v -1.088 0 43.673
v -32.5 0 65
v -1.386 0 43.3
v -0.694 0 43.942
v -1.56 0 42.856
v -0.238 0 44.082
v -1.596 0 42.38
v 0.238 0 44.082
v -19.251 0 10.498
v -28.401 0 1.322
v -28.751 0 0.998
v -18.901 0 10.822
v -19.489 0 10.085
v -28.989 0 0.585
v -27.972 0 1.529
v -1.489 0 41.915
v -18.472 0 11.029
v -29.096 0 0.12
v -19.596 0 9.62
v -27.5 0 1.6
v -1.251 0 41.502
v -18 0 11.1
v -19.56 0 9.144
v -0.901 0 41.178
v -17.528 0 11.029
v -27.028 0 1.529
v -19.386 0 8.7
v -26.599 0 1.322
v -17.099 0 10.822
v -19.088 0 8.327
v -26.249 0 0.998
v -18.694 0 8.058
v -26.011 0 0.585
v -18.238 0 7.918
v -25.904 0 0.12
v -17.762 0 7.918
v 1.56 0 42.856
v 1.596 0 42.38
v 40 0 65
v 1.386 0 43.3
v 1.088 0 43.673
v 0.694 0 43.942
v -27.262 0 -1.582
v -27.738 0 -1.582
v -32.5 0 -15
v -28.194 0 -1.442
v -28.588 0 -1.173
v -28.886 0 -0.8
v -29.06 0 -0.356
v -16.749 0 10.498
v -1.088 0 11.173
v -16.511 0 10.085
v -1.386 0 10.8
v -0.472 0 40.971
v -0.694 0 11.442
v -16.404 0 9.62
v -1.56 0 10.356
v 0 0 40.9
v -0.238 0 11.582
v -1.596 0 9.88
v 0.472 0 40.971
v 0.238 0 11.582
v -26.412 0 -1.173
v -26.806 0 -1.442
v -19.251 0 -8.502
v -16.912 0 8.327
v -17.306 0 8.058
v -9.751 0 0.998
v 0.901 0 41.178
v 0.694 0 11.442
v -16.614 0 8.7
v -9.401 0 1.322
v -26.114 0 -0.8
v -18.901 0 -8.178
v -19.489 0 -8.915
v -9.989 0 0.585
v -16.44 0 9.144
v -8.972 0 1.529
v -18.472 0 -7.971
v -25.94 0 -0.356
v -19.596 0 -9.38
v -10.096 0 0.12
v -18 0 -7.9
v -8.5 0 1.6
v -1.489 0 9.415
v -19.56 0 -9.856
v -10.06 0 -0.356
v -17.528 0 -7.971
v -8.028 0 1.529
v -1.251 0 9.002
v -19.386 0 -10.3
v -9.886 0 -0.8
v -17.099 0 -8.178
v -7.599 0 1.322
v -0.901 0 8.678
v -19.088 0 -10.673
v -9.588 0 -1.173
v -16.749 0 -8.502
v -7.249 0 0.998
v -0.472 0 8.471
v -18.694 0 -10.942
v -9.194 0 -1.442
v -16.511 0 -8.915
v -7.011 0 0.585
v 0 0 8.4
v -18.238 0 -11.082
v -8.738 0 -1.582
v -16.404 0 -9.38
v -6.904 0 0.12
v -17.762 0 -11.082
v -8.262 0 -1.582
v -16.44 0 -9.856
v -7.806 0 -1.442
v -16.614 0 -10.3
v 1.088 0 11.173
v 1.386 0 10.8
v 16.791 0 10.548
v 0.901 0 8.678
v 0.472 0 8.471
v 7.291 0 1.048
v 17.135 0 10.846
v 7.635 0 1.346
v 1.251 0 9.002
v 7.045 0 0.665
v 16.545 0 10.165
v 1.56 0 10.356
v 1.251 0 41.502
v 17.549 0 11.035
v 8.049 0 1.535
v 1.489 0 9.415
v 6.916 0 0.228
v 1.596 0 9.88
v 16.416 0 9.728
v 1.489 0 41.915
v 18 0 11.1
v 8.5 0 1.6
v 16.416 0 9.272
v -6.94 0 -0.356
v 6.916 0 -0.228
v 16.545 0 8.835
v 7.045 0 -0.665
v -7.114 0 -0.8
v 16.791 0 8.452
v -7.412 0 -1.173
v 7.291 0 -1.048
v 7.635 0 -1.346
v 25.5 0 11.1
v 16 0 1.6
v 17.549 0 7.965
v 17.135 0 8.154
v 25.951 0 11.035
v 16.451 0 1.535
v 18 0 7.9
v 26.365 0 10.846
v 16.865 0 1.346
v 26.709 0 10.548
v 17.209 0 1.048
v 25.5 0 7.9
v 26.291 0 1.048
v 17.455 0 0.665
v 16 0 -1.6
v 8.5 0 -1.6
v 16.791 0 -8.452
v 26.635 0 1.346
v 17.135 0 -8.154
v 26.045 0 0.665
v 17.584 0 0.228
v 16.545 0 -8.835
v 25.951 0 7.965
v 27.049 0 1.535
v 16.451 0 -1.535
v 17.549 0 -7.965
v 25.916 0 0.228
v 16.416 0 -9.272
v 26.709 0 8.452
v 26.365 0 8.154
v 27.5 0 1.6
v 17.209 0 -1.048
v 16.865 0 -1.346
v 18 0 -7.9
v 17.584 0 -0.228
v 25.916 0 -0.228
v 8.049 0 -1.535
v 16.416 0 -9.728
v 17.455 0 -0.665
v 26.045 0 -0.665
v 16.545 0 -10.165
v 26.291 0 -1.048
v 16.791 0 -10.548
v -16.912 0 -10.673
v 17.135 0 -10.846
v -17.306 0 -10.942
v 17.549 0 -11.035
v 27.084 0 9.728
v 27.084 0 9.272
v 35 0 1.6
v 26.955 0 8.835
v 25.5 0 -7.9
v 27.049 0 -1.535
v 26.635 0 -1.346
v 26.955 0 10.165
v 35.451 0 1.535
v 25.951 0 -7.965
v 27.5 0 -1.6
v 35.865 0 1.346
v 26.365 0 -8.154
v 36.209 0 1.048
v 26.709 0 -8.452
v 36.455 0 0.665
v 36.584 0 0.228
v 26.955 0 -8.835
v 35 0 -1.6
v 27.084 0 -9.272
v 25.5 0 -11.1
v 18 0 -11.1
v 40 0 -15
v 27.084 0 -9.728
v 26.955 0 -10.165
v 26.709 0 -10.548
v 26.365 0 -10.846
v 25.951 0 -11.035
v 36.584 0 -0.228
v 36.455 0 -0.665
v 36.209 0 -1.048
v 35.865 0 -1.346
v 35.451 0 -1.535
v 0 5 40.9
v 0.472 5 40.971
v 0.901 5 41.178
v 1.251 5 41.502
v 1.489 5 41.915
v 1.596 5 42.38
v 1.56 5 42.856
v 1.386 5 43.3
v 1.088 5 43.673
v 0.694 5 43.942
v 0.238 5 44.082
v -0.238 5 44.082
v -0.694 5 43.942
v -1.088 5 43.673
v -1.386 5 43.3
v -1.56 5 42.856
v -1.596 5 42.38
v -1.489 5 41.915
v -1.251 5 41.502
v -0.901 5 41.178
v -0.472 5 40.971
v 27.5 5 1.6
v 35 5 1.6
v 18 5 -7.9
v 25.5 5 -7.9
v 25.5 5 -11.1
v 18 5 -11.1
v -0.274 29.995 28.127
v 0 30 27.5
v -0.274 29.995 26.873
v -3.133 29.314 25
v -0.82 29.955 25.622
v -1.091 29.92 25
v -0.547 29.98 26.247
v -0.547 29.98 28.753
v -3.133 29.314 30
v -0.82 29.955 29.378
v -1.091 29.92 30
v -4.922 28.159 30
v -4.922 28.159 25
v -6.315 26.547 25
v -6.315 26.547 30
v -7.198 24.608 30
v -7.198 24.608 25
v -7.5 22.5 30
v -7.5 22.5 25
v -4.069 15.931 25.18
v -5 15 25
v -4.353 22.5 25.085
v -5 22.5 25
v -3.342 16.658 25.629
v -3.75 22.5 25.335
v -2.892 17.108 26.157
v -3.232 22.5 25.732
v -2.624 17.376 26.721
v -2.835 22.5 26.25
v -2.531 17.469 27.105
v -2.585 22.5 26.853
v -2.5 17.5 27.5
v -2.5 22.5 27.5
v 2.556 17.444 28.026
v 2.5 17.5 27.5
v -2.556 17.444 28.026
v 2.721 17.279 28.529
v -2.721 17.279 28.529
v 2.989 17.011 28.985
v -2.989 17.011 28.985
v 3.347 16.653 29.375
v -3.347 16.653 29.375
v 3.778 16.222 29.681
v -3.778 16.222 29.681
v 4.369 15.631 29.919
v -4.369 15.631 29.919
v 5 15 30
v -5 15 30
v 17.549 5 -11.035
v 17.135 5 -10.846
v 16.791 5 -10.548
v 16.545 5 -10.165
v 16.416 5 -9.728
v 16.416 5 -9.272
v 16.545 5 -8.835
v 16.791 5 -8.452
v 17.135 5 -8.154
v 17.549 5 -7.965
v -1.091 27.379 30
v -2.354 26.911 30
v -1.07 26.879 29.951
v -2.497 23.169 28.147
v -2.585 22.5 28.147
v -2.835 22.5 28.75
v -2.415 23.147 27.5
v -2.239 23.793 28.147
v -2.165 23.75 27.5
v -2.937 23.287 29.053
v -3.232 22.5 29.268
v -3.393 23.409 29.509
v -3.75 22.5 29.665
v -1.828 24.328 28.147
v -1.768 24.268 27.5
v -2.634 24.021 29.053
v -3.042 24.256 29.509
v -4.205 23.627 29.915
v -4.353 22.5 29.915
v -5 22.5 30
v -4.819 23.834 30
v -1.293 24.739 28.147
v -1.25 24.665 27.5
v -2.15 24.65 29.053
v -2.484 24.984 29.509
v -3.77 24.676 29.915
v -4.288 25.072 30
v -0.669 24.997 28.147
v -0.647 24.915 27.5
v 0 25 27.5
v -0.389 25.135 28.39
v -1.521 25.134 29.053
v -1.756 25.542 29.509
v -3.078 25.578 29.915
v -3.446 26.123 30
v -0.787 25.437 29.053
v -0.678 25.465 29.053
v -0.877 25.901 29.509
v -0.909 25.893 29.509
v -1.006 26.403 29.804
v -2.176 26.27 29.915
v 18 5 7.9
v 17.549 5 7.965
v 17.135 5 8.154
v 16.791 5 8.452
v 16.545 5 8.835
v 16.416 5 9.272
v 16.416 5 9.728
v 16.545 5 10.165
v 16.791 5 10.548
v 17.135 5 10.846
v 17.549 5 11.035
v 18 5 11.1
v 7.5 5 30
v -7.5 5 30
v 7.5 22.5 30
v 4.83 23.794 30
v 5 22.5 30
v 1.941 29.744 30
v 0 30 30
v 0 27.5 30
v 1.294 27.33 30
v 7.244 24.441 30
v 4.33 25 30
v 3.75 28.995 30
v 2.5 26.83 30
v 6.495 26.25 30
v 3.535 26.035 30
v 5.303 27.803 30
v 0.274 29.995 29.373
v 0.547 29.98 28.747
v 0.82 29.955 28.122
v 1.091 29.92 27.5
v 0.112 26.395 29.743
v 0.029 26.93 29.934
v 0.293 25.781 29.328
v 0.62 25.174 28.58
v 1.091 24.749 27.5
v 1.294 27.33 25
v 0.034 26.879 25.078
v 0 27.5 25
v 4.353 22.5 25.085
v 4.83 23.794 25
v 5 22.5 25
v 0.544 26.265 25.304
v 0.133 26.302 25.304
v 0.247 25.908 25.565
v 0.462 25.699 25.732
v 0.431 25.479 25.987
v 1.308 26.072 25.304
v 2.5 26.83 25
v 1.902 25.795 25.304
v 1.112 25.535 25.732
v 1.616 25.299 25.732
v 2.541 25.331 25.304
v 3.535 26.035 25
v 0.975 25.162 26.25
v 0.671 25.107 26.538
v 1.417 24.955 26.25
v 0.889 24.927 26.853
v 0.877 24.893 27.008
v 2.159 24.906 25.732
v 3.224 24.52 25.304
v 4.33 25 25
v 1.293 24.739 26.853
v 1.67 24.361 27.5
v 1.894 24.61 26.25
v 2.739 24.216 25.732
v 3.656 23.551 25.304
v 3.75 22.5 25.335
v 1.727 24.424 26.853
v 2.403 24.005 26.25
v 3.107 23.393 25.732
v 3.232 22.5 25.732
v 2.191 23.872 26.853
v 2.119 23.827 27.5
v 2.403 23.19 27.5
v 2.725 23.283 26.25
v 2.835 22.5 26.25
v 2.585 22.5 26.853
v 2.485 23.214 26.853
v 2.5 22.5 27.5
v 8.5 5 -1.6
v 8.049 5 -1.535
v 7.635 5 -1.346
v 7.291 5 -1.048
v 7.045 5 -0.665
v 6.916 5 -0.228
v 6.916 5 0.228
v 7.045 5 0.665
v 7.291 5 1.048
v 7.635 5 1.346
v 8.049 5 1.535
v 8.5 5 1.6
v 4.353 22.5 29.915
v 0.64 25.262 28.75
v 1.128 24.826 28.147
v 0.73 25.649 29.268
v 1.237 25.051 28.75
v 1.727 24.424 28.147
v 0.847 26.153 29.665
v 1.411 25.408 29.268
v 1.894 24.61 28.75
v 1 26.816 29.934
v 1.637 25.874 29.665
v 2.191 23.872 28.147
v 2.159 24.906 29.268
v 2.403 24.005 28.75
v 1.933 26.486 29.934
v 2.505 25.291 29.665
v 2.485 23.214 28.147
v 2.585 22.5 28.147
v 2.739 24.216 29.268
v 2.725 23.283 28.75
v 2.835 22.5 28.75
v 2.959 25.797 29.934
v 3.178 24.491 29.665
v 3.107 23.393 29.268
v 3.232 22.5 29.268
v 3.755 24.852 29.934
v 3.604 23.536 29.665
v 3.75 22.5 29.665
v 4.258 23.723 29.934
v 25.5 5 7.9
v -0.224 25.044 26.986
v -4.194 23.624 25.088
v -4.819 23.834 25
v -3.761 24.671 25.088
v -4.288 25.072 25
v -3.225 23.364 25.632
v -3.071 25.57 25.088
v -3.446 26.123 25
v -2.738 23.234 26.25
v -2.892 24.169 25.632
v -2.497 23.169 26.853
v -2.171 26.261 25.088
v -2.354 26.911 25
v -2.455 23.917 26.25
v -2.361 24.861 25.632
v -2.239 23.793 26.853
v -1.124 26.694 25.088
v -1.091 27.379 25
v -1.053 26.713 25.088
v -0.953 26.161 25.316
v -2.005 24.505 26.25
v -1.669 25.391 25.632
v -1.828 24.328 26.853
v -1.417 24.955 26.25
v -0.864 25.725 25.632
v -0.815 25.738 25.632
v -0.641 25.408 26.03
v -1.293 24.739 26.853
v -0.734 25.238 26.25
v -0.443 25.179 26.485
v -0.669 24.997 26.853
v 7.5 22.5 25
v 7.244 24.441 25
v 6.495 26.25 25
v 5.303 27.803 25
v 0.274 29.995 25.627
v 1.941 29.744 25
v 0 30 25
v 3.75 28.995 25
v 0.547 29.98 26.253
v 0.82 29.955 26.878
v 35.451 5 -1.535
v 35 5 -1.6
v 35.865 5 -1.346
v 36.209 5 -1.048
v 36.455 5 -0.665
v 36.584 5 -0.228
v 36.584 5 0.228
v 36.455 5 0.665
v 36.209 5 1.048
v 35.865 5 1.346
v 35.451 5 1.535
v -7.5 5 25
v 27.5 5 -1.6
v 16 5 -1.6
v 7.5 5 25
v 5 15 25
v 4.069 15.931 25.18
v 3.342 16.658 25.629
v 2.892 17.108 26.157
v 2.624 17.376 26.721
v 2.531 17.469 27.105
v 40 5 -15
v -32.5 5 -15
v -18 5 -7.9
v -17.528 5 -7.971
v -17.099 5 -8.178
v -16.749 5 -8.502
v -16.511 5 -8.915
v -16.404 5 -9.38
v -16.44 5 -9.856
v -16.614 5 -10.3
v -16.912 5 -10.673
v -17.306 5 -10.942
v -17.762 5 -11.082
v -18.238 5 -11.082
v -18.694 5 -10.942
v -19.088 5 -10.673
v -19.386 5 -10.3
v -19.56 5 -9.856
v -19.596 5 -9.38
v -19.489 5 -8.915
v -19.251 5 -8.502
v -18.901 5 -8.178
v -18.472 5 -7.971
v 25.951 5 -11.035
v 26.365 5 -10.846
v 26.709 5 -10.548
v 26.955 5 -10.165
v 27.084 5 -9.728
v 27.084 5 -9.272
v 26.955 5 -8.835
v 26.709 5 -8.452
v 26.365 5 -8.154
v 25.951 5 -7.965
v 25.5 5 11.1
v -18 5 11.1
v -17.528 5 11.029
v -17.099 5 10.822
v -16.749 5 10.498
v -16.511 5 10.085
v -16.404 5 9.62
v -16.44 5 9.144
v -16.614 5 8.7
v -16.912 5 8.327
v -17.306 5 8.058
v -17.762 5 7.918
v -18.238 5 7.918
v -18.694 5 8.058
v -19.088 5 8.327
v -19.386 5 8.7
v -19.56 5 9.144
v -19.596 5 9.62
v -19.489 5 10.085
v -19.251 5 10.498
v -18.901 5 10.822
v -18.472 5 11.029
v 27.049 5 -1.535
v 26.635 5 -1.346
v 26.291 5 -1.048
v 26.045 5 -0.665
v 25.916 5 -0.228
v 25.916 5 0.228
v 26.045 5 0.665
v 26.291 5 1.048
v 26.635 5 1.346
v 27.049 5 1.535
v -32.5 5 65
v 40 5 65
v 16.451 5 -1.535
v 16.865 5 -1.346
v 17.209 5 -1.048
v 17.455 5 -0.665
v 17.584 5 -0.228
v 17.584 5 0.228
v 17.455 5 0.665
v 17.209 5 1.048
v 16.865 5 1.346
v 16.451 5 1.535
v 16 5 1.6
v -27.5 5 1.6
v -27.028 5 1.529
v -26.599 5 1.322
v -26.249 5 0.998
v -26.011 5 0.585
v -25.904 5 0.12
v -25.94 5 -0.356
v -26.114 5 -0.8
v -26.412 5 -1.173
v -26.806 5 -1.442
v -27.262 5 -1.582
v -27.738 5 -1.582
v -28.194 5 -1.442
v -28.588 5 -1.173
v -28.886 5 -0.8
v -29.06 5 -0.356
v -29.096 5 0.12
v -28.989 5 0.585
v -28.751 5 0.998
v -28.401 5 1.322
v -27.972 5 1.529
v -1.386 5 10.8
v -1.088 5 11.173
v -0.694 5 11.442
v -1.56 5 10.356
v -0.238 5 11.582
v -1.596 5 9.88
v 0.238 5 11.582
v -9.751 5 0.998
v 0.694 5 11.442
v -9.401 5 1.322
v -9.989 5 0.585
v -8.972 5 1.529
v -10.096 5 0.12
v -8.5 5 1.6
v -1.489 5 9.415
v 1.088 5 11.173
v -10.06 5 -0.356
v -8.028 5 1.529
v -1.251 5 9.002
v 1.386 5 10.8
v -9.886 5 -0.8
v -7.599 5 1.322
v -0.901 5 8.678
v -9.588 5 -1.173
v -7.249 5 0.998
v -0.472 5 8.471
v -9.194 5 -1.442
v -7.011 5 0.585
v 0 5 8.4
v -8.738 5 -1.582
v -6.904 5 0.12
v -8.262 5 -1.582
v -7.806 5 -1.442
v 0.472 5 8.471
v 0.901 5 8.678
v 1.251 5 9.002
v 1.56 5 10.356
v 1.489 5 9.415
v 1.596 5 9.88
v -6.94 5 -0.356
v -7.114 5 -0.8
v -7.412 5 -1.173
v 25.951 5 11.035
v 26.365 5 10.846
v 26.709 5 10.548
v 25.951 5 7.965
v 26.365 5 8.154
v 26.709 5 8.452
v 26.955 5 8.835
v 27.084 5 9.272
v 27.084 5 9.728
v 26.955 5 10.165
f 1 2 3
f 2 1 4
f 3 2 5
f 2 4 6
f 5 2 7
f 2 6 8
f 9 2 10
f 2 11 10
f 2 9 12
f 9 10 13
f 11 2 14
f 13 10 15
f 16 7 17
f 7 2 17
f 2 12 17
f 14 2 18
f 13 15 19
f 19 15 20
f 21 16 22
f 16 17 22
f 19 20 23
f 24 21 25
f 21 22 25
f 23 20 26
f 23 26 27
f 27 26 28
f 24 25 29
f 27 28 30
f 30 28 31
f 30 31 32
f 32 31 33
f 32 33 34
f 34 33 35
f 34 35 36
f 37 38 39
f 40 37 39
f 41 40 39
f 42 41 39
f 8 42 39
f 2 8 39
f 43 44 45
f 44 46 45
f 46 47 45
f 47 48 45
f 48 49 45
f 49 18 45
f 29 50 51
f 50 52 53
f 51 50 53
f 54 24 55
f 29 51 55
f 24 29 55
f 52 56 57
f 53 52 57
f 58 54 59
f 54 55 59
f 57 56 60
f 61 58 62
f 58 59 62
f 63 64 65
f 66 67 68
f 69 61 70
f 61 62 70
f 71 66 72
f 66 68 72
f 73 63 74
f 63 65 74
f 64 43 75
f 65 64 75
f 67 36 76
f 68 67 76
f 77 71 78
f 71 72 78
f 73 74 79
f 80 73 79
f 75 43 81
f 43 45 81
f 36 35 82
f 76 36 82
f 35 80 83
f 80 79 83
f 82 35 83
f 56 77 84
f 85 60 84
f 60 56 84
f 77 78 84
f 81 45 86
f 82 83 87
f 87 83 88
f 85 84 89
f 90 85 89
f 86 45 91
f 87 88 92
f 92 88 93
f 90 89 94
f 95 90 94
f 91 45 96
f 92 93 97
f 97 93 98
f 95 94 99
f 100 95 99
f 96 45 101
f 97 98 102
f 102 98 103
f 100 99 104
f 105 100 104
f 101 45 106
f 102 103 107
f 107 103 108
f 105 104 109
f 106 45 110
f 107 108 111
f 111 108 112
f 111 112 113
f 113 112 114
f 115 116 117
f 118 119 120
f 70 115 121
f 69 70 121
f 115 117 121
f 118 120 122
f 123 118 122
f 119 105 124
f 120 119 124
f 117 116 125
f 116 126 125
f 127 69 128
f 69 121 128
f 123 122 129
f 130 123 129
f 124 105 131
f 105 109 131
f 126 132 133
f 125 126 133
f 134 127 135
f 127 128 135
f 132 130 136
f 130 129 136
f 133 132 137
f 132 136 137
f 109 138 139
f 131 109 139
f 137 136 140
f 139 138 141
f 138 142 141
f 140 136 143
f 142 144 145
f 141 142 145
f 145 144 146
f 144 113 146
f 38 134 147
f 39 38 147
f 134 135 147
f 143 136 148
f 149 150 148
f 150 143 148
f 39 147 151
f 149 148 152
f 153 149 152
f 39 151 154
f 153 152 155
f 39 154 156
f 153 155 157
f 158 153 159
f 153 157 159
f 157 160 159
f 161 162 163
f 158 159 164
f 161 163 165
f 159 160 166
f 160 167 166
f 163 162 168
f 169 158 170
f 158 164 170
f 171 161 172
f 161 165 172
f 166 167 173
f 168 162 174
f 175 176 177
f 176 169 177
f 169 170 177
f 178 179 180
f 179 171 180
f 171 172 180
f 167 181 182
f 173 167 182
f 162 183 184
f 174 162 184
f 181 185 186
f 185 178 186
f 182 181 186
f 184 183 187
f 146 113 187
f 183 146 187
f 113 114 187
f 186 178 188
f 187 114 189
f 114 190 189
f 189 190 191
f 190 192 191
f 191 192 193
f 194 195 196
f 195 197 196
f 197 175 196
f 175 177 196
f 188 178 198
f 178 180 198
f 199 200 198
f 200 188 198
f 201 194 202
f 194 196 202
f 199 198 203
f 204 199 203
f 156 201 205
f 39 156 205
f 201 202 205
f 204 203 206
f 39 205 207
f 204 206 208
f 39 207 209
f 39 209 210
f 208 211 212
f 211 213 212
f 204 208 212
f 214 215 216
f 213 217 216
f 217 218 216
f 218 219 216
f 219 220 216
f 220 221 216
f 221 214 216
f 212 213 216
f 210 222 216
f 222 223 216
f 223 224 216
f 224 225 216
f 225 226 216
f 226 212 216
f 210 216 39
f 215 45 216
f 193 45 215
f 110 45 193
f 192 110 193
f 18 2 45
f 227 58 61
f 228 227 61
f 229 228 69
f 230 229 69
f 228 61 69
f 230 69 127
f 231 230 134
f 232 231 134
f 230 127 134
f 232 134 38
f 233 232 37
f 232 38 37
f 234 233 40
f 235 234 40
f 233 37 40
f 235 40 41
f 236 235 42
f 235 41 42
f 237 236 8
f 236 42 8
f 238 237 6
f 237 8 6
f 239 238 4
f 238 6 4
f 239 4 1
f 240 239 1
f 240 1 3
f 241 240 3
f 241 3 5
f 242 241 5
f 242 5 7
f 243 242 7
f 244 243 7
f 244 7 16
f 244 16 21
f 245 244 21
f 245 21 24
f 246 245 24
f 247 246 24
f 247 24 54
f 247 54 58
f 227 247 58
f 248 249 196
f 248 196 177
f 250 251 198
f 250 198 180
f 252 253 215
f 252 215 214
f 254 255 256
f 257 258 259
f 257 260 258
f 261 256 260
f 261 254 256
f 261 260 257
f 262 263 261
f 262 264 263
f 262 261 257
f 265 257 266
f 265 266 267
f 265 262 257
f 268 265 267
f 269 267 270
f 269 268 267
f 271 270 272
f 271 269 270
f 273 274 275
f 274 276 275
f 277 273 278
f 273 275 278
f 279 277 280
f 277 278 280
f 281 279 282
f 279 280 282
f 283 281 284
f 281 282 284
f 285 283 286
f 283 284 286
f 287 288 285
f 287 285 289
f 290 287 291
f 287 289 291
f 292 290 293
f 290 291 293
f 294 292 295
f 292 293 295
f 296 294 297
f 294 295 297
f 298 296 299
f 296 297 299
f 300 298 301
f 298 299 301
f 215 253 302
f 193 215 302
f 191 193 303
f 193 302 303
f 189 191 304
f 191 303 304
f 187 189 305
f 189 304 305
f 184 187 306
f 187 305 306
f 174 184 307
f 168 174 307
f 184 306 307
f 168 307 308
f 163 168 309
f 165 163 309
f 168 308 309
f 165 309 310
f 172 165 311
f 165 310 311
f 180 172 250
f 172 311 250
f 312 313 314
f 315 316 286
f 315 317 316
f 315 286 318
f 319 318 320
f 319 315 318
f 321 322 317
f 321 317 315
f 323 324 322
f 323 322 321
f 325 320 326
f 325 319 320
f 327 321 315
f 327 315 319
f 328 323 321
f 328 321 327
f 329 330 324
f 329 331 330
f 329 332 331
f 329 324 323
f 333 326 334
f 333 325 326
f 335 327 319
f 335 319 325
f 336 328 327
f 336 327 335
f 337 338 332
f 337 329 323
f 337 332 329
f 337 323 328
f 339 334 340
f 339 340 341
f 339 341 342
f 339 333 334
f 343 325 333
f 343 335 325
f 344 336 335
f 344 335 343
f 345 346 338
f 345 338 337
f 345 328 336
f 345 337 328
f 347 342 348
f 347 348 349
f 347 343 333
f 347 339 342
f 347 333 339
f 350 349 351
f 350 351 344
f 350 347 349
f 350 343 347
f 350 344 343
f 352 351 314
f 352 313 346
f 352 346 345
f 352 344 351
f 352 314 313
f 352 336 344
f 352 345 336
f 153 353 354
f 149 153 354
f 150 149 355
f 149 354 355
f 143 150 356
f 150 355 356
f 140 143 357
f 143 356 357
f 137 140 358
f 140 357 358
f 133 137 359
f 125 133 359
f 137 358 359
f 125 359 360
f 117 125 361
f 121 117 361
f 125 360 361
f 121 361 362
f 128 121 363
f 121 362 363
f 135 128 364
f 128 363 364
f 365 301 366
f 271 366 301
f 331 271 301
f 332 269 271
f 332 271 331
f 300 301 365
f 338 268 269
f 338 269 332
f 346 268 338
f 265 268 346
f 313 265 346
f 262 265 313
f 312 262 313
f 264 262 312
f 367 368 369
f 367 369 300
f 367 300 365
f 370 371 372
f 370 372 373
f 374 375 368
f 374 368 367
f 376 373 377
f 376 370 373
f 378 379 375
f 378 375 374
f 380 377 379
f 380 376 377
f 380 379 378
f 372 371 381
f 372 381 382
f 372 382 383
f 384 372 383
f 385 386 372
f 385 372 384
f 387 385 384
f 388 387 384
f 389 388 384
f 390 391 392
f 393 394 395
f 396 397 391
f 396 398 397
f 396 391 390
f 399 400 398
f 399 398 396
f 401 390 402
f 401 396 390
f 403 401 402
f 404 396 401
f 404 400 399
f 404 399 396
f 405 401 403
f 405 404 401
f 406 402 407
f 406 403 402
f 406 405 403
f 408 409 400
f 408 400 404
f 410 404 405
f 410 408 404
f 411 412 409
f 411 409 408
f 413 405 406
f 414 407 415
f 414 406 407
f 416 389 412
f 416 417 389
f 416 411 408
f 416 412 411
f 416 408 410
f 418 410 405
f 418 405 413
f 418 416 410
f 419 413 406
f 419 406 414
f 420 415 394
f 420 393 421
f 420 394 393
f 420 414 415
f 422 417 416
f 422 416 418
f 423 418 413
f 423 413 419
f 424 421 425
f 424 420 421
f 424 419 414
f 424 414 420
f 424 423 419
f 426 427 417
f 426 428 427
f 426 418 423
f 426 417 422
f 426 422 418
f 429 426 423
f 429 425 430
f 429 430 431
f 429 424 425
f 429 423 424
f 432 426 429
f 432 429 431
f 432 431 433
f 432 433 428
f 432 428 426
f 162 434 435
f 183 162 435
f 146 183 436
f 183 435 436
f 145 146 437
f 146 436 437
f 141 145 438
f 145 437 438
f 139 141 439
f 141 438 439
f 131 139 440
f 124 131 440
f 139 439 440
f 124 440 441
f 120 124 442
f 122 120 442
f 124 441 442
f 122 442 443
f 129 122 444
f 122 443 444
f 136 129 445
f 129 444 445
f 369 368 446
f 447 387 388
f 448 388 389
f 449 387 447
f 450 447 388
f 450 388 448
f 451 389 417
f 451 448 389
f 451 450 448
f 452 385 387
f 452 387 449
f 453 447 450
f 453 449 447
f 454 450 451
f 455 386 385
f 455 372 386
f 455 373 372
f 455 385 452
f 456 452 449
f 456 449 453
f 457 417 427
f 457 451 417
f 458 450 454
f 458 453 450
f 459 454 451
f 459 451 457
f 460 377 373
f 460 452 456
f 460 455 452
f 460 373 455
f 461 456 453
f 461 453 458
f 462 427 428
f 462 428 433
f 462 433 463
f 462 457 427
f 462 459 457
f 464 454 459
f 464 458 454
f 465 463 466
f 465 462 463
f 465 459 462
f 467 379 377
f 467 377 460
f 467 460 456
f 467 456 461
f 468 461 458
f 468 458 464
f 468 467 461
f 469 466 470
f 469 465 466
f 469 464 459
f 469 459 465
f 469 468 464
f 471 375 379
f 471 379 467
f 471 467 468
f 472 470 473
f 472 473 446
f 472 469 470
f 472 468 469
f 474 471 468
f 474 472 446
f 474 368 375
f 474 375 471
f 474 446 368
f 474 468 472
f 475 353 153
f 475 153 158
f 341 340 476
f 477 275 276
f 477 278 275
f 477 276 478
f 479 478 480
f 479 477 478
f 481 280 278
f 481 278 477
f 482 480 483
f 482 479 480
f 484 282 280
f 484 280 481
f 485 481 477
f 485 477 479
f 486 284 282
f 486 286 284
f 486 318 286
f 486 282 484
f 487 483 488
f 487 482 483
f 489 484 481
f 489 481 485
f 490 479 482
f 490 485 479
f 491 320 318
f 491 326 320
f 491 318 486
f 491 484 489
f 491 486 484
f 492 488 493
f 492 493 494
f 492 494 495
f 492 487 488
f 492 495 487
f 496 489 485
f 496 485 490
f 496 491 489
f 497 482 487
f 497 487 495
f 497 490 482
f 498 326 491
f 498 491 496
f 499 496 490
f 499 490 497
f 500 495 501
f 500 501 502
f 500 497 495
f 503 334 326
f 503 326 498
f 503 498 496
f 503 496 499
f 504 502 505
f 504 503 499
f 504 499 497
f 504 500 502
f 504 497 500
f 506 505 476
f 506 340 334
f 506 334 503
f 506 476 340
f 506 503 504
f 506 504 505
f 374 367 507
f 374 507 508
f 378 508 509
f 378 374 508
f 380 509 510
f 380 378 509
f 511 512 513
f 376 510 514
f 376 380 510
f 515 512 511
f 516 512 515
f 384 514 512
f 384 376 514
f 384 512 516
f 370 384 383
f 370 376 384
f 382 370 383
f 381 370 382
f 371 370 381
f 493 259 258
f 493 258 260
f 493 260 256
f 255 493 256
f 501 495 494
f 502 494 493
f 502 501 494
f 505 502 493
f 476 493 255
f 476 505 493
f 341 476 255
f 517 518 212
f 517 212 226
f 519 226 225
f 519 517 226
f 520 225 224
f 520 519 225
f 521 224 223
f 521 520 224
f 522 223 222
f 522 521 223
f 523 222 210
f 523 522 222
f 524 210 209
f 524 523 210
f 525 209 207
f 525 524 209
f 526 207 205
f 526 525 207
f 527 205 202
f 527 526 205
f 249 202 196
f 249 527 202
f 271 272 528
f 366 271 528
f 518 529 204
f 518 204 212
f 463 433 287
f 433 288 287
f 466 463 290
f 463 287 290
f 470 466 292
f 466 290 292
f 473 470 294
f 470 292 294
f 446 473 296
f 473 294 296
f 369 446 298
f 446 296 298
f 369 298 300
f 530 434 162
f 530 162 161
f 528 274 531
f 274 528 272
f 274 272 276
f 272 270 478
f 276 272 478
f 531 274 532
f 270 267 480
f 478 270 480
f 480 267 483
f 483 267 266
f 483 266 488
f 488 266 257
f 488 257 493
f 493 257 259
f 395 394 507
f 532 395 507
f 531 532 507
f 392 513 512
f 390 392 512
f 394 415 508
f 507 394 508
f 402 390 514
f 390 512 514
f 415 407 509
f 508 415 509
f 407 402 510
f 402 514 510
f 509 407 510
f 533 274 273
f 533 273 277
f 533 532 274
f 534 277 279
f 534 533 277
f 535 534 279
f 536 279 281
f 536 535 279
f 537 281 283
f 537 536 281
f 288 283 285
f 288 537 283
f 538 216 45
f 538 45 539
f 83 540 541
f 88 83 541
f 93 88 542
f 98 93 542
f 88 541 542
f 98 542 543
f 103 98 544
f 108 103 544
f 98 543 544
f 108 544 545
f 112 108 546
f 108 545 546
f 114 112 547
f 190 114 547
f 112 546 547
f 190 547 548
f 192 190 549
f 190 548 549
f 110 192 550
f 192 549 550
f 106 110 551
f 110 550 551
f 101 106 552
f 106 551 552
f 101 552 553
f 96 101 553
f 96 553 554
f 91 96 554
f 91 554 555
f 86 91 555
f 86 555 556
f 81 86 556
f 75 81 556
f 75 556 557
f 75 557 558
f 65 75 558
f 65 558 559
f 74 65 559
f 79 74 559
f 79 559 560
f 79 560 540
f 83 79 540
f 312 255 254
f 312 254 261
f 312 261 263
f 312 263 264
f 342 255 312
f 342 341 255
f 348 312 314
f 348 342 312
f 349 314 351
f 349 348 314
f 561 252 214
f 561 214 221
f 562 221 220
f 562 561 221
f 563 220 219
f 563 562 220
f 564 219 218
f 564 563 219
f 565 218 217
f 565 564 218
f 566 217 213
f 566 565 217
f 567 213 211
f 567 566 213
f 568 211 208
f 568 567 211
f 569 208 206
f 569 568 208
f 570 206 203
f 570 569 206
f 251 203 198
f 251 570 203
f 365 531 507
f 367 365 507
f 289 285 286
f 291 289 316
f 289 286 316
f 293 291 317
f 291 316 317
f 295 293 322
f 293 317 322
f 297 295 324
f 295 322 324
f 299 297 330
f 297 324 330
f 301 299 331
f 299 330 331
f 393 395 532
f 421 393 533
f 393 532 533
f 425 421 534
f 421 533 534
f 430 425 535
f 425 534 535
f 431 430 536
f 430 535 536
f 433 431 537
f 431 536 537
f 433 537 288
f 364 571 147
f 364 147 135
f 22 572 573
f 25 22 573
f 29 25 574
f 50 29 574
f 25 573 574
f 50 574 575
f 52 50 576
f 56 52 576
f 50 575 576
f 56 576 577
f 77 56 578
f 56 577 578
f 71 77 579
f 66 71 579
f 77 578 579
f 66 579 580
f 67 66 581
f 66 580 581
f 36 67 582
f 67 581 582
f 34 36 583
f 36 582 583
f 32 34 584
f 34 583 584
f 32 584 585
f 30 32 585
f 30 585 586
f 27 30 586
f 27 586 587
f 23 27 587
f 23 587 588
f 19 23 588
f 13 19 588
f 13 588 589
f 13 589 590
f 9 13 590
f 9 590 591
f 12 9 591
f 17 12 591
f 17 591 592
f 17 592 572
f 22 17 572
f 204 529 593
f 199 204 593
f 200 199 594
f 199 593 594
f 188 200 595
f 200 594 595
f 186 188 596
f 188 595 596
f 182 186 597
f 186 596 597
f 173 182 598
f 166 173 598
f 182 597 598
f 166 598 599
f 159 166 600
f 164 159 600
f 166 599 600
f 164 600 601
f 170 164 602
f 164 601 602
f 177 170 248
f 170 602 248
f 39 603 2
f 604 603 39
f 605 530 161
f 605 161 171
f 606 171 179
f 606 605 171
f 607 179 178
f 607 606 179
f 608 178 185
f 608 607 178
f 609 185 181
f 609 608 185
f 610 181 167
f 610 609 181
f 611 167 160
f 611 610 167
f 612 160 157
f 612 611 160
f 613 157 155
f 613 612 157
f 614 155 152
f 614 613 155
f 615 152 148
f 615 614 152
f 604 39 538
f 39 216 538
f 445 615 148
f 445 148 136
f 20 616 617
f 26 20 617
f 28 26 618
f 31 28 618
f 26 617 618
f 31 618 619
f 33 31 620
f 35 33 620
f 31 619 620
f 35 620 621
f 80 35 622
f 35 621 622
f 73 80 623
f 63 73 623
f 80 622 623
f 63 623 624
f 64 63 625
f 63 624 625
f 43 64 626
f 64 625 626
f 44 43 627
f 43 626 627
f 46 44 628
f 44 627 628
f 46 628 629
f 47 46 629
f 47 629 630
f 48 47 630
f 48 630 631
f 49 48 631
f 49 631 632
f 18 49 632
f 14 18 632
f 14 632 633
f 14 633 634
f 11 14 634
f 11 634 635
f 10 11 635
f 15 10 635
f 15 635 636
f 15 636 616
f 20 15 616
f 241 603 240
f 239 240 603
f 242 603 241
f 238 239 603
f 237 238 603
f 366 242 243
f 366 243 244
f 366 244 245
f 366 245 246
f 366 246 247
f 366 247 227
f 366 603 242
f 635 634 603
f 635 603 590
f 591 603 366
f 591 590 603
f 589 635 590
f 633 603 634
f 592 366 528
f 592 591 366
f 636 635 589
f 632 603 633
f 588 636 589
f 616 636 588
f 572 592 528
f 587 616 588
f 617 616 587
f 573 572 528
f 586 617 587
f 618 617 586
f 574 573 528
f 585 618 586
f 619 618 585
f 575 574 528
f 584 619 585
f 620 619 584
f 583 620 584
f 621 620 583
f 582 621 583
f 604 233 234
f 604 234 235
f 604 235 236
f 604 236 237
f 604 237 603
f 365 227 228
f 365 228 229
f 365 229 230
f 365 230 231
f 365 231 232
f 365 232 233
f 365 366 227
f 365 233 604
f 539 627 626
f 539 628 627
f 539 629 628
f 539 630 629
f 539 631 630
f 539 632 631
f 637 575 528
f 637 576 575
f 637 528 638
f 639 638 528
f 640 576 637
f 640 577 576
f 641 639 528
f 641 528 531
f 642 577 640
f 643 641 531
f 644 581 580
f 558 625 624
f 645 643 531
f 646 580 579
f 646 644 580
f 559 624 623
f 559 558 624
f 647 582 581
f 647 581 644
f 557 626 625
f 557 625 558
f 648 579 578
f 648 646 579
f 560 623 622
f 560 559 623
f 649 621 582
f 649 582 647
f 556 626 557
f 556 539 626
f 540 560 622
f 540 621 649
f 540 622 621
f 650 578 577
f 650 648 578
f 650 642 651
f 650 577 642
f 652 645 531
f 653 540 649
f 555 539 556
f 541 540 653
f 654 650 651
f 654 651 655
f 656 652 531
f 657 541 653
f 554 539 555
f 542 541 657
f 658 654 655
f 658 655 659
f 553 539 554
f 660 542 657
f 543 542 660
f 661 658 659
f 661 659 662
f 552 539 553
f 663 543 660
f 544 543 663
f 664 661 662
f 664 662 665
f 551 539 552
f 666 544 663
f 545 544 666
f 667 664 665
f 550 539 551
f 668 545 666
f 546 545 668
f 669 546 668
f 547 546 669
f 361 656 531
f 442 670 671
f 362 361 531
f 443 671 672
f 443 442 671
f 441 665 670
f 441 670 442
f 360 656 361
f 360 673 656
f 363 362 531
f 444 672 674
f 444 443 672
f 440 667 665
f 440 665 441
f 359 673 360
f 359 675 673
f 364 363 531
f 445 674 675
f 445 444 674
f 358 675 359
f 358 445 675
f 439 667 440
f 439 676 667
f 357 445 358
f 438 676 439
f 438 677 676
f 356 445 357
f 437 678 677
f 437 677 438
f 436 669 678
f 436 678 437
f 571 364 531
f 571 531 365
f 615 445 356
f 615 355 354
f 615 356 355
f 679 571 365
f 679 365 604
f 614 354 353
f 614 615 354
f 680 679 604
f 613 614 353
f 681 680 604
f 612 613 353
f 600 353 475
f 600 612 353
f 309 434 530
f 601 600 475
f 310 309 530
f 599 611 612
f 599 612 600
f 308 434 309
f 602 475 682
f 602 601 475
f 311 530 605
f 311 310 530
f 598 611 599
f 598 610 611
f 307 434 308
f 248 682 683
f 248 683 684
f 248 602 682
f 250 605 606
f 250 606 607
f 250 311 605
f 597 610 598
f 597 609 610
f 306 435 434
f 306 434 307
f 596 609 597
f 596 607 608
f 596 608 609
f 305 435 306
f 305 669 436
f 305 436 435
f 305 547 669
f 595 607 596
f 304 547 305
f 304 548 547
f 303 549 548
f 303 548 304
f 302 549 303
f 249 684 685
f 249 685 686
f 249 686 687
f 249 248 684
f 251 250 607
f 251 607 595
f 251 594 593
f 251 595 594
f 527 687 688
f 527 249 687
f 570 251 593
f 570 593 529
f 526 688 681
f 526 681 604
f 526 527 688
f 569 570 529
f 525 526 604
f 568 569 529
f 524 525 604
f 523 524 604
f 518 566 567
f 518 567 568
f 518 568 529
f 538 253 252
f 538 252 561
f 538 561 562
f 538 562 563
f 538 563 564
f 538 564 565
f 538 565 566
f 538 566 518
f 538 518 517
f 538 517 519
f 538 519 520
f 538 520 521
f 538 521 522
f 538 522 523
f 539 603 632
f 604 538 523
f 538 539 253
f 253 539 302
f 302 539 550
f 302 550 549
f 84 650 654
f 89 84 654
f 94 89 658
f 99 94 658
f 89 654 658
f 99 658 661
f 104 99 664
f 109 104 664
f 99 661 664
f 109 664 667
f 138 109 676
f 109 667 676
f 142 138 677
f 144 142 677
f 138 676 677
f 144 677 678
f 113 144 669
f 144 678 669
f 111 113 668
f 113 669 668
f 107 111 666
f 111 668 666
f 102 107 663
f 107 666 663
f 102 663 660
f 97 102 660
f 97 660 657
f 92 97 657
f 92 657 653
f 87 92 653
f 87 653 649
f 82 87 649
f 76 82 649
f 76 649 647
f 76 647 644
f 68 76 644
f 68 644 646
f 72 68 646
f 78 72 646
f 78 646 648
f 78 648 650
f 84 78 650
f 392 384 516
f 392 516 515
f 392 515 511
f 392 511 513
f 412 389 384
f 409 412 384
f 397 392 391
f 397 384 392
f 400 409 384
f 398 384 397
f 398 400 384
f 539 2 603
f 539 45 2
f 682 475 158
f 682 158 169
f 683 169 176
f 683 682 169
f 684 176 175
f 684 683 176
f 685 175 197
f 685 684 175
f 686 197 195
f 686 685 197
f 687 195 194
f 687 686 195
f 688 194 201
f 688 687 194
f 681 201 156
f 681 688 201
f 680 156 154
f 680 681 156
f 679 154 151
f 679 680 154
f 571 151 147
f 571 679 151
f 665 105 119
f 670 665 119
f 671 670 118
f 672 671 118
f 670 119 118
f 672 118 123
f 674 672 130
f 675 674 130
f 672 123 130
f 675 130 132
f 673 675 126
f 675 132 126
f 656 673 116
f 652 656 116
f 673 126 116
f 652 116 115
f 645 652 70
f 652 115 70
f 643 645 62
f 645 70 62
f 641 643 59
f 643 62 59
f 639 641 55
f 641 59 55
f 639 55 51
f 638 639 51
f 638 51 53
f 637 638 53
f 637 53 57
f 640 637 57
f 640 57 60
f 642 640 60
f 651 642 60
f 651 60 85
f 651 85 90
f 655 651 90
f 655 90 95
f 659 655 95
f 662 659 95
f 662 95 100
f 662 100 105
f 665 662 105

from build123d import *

# Parameters (mm, degrees)
SKETCH2_W           = 65
SKETCH2_H           = 30
BOSS_EXTRUDE1_DEPTH = 5
SKETCH3_R           = 1.6
CUT_EXTRUDE1_DEPTH  = 37.142080737
SKETCH5_W           = 30
SKETCH5_H           = 5
BOSS_EXTRUDE2_DEPTH = 7.5
CUT_EXTRUDE2_DEPTH  = 10
SKETCH7_W           = 72.5
SKETCH7_H           = 5
BOSS_EXTRUDE3_DEPTH = 50
BOSS_EXTRUDE4_DEPTH = 5
BOSS_EXTRUDE5_DEPTH = 5
SKETCH6_R           = 1.6
CUT_EXTRUDE3_DEPTH  = 10
CUT_EXTRUDE4_DEPTH  = 79.302298817
FILLET1_R           = 2.5


with BuildPart() as part:
    # Sketch2 → Boss-Extrude1 (new body)
    with BuildSketch(Plane(origin=(0, 0, 0), x_dir=(1, 0, 0), z_dir=(0, 1, 0))):
        Rectangle(SKETCH2_W, SKETCH2_H)
    extrude(amount=BOSS_EXTRUDE1_DEPTH)

    # Sketch3 → Cut-Extrude1 (cut, through all)
    with BuildSketch(Plane(origin=(0, 5, 0), x_dir=(1, 0, 0), z_dir=(0, 1, 0))):
        with Locations(Location((-27.5, 0, 0), (0, 0, 270))):
            Circle(SKETCH3_R)
        with Locations(Location((-18, 9.5, 0), (0, 0, 270))):
            Circle(SKETCH3_R)
        with Locations(Location((-8.5, 0, 0), (0, 0, 270))):
            Circle(SKETCH3_R)
        with Locations(Location((-18, -9.5, 0), (0, 0, 270))):
            Circle(SKETCH3_R)
        with Locations(Location((18, -9.5, 0), (0, 0, 90))):
            Circle(SKETCH3_R)
        with Locations(Location((27.5, 0, 0), (0, 0, 90))):
            Circle(SKETCH3_R)
        with Locations(Location((18, 9.5, 0), (0, 0, 90))):
            Circle(SKETCH3_R)
        with Locations(Location((8.5, 0, 0), (0, 0, 90))):
            Circle(SKETCH3_R)
    extrude(amount=-CUT_EXTRUDE1_DEPTH, mode=Mode.SUBTRACT)

    # Sketch5 → Boss-Extrude2 (add)
    with BuildSketch(Plane(origin=(32.5, 0, 0), x_dir=(0, 0, -1), z_dir=(1, 0, 0))):
        with Locations((0, 2.5)):
            Rectangle(SKETCH5_W, SKETCH5_H)
    extrude(amount=BOSS_EXTRUDE2_DEPTH)

    # Sketch4 → Cut-Extrude2 (cut)
    with BuildSketch(Plane(origin=(0, 5, 0), x_dir=(1, 0, 0), z_dir=(0, 1, 0))):
        with BuildLine():
            Line((8.5, 1.6), (16, 1.6))
            ThreePointArc((16, 1.6), (17.6, 0), (16, -1.6))
            Line((16, -1.6), (8.5, -1.6))
            ThreePointArc((8.5, -1.6), (6.9, 0), (8.5, 1.6))
        make_face()
        with BuildLine():
            Line((27.5, 1.6), (35, 1.6))
            ThreePointArc((35, 1.6), (36.6, 0), (35, -1.6))
            Line((35, -1.6), (27.5, -1.6))
            ThreePointArc((27.5, -1.6), (25.9, 0), (27.5, 1.6))
        make_face()
        with BuildLine():
            Line((18, -7.9), (25.5, -7.9))
            ThreePointArc((25.5, -7.9), (27.1, -9.5), (25.5, -11.1))
            Line((25.5, -11.1), (18, -11.1))
            ThreePointArc((18, -11.1), (16.4, -9.5), (18, -7.9))
        make_face()
        with BuildLine():
            Line((18, 11.1), (25.5, 11.1))
            ThreePointArc((25.5, 11.1), (27.1, 9.5), (25.5, 7.9))
            Line((25.5, 7.9), (18, 7.9))
            ThreePointArc((18, 7.9), (16.4, 9.5), (18, 11.1))
        make_face()
    extrude(amount=-CUT_EXTRUDE2_DEPTH, mode=Mode.SUBTRACT)

    # Sketch7 → Boss-Extrude3 (add)
    with BuildSketch(Plane.XY.offset(15)):
        with Locations((3.75, 2.5)):
            Rectangle(SKETCH7_W, SKETCH7_H)
    extrude(amount=BOSS_EXTRUDE3_DEPTH)

    # Sketch10 → Boss-Extrude4 (add)
    with BuildSketch(Plane.XY.offset(25)):
        Polygon((-7.5, 5), (7.5, 5), (7.5, 22.5), (2.5, 22.5), (2.5, 17.5), (-2.5, 17.5), (-2.5, 22.5), (-7.5, 22.5), align=None)
    extrude(amount=BOSS_EXTRUDE4_DEPTH)

    # Sketch11 → Boss-Extrude5 (add)
    with BuildSketch(Plane.XY.offset(30)):
        with BuildLine():
            Line((-7.5, 22.5), (-2.5, 22.5))
            ThreePointArc((-2.5, 22.5), (0, 25), (2.5, 22.5))
            Line((2.5, 22.5), (7.5, 22.5))
            ThreePointArc((7.5, 22.5), (0, 30), (-7.5, 22.5))
        make_face()
    extrude(amount=-BOSS_EXTRUDE5_DEPTH)

    # Sketch6 → Cut-Extrude3 (cut)
    with BuildSketch(Plane.XZ):
        with Locations(Location((0, 42.5, 0), (0, 0, 270))):
            Circle(SKETCH6_R)
        with Locations(Location((0, 10, 0), (0, 0, 270))):
            Circle(SKETCH6_R)
    extrude(amount=-CUT_EXTRUDE3_DEPTH, mode=Mode.SUBTRACT)

    # Sketch14 → Cut-Extrude4 (cut, through all)
    with BuildSketch(Plane(origin=(0, 17.5, 0), x_dir=(1, 0, 0), z_dir=(0, 1, 0))):
        Polygon((-1.091089451, -25), (0, -27.5), (-1.091089451, -30), (0, -30), (1.091089451, -27.5), (0, -25), align=None)
    extrude(amount=CUT_EXTRUDE4_DEPTH, mode=Mode.SUBTRACT)

    # Fillet1
    fillet1_edges = [part.edges().sort_by_distance(p)[0] for p in [
        (-2.5, 20, 25),
        (1.767766953, 24.267766953, 25),
        (1.767766953, 24.267766953, 30),
        (-2.118693421, 23.827078817, 30),
        (-2.118693421, 23.827078817, 25),
        (2.5, 20, 25),
        (0, 17.5, 25),
        (2.5, 20, 30),
        (0, 17.5, 30),
        (-2.5, 20, 30),
    ]]
    fillet(fillet1_edges, radius=FILLET1_R - 0.0001)  # a hair under: the kernel refuses the full size


solid = part.part
